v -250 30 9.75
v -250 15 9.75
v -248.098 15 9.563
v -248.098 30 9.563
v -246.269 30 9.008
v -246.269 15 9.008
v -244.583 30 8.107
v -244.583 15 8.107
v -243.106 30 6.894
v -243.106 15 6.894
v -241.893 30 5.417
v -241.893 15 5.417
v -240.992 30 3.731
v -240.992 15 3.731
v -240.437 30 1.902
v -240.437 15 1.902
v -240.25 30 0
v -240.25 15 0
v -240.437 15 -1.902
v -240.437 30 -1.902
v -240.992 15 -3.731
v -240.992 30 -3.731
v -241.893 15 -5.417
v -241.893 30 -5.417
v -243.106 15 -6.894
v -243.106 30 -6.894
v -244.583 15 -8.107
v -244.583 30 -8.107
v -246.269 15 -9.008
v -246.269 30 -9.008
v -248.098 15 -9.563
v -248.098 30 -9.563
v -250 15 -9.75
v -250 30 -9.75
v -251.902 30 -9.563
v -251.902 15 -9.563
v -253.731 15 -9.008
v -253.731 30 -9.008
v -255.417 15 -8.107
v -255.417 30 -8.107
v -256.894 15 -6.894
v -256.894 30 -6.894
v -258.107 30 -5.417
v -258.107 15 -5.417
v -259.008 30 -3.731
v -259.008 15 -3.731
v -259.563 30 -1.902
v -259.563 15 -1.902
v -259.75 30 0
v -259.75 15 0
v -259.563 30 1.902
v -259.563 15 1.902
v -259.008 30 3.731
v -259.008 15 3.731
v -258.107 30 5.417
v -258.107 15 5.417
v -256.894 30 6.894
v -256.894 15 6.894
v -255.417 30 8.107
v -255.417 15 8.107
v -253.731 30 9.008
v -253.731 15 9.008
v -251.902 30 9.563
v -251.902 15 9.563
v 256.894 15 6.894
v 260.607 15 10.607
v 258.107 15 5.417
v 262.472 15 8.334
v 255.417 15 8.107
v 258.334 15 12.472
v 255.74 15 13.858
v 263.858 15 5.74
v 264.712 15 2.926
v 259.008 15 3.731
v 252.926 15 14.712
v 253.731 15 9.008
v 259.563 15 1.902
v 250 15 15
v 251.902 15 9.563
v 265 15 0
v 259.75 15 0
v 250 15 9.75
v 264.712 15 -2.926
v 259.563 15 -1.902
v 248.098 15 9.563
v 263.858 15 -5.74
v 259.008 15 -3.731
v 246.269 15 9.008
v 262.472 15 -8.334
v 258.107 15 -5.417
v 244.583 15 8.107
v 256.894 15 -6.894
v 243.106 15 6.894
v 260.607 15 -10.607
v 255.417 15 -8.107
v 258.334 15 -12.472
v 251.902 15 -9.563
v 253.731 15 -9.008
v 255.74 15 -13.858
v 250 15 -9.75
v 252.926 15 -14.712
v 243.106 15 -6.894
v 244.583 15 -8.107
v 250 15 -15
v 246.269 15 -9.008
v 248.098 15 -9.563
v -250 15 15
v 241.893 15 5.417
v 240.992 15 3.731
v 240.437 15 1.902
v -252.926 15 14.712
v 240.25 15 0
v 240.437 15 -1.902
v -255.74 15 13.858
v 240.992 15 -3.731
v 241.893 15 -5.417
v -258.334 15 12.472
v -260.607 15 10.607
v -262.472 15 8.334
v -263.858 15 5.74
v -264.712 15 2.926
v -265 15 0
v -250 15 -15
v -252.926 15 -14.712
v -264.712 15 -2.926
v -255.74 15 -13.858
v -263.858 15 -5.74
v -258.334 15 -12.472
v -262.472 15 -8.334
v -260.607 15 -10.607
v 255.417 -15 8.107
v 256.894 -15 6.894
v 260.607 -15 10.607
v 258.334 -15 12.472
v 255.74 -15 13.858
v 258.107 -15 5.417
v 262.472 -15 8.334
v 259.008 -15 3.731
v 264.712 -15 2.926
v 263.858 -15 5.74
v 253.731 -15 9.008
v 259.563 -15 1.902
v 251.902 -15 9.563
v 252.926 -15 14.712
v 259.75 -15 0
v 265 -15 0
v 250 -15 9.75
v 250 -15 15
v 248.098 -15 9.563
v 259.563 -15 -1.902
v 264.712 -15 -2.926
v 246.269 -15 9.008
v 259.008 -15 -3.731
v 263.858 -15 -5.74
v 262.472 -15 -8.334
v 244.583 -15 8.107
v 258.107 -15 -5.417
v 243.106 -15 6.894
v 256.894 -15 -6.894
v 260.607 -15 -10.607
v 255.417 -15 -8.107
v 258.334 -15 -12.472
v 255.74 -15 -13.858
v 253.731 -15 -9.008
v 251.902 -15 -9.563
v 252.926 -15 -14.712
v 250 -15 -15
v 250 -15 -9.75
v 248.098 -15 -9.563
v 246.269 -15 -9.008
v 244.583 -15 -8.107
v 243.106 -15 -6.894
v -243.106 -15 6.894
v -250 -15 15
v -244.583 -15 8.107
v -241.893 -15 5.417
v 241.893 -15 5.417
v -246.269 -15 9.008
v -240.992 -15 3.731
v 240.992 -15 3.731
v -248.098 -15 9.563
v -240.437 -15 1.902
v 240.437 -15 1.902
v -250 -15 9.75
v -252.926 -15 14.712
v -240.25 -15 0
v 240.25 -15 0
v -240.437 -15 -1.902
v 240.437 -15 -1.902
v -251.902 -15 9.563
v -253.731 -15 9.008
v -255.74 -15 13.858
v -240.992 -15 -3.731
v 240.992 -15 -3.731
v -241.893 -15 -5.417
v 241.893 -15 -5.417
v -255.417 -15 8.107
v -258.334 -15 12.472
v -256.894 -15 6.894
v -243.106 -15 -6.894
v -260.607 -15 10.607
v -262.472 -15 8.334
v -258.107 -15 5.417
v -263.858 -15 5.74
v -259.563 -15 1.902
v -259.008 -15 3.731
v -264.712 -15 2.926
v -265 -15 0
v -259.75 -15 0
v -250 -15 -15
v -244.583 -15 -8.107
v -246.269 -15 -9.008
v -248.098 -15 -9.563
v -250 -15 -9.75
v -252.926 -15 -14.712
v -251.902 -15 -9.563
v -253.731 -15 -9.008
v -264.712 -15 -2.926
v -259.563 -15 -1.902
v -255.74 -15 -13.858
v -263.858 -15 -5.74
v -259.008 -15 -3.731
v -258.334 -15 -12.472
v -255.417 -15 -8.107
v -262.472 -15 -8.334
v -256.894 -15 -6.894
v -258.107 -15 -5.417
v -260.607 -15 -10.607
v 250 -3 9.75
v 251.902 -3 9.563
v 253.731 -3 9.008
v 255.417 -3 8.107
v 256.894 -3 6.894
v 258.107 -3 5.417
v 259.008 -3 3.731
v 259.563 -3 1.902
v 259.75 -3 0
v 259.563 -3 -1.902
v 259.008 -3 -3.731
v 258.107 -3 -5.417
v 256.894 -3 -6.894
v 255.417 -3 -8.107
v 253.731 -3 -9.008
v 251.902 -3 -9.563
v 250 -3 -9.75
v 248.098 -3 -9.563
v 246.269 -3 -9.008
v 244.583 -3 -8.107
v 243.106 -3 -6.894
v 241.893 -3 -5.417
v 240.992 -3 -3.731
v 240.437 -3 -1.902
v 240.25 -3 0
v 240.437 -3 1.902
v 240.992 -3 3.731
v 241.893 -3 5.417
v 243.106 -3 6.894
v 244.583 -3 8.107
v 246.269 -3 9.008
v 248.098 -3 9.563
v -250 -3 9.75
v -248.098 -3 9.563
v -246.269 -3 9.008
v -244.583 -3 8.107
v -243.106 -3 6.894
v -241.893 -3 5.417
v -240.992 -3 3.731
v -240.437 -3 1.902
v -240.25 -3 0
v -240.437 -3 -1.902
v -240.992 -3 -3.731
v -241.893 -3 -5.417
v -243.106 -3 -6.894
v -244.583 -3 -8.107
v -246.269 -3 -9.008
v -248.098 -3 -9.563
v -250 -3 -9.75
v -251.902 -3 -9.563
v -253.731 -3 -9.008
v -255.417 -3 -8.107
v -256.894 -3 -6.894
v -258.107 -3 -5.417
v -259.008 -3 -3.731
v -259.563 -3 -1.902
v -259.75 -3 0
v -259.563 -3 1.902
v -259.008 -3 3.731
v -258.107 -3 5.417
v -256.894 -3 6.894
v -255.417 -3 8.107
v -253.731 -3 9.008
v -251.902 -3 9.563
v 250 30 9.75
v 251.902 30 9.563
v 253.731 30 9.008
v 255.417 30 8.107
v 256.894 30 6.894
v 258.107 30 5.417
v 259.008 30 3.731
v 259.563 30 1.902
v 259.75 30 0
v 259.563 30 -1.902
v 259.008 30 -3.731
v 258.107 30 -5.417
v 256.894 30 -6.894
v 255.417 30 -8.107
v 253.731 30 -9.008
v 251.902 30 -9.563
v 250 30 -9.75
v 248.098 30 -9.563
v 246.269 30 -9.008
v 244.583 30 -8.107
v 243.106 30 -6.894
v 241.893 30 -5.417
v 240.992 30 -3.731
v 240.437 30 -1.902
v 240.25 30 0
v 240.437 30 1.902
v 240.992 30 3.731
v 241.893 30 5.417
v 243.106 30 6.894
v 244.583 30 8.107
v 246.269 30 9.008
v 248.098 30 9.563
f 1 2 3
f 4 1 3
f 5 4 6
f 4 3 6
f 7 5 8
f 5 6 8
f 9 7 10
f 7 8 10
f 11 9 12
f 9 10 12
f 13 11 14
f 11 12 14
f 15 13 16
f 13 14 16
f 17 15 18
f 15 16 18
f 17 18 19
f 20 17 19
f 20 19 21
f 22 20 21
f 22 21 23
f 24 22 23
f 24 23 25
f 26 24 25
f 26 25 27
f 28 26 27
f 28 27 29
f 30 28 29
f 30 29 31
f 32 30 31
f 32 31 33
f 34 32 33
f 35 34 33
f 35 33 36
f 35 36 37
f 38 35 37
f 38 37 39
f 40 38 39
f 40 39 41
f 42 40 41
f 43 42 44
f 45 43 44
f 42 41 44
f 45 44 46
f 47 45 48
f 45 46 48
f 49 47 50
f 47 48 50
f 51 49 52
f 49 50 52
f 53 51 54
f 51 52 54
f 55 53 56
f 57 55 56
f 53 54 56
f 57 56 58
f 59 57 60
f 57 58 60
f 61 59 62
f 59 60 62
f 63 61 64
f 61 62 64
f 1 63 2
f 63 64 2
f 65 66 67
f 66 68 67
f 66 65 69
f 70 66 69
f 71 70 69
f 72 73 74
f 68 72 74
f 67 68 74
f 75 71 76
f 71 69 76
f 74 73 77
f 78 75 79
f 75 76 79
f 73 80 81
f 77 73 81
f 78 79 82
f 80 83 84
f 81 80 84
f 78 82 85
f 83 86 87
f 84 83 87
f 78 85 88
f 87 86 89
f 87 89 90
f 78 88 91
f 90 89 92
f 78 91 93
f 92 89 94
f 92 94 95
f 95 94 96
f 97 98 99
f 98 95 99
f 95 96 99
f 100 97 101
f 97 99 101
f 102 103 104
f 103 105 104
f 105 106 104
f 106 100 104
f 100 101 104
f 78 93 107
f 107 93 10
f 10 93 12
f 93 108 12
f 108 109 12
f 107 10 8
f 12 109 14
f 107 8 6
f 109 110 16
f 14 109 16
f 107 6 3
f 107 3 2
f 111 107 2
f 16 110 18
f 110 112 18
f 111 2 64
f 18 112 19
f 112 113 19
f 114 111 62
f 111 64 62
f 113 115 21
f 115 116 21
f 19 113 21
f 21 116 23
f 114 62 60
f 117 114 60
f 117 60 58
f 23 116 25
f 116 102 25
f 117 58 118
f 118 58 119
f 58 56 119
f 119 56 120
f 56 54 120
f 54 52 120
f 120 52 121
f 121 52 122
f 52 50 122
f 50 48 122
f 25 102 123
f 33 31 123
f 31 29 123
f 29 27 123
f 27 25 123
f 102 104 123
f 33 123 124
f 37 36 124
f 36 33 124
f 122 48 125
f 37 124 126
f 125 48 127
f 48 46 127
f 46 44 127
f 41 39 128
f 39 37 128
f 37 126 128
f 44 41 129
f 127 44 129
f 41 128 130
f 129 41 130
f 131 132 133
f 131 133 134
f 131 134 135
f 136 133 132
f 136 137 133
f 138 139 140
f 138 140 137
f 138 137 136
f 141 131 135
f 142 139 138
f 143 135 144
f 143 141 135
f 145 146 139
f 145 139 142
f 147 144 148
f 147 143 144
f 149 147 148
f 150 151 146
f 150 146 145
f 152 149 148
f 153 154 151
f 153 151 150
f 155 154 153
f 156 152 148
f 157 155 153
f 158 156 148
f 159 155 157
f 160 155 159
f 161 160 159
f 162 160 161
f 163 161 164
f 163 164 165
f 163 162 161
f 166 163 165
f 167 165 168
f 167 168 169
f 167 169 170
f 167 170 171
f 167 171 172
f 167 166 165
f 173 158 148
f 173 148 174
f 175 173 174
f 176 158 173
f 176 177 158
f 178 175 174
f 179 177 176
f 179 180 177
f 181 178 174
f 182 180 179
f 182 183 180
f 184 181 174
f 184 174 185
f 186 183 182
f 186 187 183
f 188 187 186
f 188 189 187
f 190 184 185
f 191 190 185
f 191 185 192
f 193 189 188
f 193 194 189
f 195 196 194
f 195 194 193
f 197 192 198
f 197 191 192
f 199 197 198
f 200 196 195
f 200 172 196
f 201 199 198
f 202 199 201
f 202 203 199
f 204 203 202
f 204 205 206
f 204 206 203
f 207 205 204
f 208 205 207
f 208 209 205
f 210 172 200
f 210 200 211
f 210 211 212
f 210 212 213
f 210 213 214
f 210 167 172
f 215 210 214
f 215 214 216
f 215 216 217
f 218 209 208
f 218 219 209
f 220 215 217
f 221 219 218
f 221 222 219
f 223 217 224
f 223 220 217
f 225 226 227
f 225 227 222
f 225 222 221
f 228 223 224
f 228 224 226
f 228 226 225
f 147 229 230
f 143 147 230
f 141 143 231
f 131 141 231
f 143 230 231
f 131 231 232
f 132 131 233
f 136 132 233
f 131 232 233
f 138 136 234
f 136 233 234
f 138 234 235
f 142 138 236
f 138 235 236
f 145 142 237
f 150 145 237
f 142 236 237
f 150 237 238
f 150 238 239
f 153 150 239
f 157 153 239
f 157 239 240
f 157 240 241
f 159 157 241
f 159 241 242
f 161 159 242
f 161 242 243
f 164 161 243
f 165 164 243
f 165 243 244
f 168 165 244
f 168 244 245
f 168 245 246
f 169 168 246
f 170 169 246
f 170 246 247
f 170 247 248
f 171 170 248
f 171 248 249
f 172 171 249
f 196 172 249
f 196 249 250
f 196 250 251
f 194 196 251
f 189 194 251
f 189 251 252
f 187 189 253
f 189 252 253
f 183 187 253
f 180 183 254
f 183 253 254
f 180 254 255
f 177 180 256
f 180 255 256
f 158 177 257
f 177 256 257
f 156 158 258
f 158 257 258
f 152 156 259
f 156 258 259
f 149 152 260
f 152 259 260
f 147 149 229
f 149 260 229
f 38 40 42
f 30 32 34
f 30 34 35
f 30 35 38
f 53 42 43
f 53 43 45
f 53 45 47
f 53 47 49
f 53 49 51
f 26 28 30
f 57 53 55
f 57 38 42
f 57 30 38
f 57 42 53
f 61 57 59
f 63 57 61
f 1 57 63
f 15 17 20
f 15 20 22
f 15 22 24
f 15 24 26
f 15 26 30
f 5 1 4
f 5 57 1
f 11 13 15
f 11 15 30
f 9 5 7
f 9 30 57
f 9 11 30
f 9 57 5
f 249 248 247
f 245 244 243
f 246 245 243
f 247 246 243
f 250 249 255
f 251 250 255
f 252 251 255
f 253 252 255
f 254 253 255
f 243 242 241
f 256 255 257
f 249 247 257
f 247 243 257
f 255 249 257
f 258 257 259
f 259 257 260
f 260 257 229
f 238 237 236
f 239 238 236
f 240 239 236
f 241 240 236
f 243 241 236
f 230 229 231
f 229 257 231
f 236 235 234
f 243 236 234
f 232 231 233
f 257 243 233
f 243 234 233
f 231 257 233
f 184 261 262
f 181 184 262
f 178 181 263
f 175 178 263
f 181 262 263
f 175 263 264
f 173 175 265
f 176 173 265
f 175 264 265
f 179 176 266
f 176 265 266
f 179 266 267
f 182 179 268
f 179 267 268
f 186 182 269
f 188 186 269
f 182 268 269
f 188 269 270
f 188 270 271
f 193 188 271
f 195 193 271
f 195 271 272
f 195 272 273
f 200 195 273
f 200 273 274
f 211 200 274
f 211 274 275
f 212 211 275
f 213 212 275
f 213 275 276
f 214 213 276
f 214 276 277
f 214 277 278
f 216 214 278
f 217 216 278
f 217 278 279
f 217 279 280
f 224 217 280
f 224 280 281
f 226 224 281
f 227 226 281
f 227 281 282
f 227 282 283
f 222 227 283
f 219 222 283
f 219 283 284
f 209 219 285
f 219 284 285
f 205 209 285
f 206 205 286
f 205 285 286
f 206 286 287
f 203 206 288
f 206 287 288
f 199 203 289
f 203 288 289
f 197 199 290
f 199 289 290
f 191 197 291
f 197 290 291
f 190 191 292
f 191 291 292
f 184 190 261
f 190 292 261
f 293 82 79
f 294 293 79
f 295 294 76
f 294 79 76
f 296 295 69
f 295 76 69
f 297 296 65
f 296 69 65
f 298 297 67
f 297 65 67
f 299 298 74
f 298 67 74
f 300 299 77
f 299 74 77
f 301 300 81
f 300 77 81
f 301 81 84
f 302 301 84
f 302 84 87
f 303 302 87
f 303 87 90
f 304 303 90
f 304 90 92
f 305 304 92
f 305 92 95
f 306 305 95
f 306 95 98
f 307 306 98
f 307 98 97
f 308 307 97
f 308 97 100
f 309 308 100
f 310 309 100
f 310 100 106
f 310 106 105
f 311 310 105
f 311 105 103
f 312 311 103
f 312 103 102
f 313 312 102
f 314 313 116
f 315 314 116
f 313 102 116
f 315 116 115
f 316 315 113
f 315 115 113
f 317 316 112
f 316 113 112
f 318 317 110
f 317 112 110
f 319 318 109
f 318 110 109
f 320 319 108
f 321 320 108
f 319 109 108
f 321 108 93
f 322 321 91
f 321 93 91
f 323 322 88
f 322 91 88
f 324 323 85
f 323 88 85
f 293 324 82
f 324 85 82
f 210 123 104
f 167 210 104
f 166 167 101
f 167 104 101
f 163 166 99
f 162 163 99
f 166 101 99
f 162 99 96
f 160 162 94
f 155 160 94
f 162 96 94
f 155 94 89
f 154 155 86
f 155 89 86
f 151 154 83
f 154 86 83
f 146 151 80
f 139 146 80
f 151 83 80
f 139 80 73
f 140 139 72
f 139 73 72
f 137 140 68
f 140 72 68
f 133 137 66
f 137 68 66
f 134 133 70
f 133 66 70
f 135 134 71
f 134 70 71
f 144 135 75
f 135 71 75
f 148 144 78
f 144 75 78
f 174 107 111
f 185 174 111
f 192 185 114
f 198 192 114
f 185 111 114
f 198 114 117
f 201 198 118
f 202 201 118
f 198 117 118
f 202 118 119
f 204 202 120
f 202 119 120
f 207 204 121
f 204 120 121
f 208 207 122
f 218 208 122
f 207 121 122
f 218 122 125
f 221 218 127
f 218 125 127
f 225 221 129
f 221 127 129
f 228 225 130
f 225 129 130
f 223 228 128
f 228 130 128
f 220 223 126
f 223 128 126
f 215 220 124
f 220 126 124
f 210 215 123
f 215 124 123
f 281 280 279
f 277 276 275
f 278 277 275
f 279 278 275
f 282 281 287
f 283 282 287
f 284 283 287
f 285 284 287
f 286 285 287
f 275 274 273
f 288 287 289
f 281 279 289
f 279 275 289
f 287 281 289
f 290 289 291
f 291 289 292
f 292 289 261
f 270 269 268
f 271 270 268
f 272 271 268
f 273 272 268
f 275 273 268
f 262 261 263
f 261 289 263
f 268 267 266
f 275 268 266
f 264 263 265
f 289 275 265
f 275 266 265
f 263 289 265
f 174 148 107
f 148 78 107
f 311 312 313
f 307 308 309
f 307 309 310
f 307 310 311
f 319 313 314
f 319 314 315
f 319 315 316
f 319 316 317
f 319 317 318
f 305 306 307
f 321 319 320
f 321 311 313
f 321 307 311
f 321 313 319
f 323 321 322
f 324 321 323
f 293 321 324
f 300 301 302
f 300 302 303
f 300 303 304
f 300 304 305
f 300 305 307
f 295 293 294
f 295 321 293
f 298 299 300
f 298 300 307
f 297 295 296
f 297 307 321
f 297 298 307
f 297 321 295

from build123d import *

# Parameters (mm, degrees)
BOSS_EXTRUDE1_DEPTH = 15
SKETCH2_R           = 9.75
BOSS_EXTRUDE2_DEPTH = 30
SKETCH2_2_R         = 9.75
CUT_EXTRUDE1_DEPTH  = 268.114207784
SKETCH2_3_R         = 9.75
BOSS_EXTRUDE3_DEPTH = 3


with BuildPart() as part:
    # Sketch1 → Boss-Extrude1 (new, symmetric)
    with BuildSketch(Plane(origin=(0, 0, 0), x_dir=(1, 0, 0), z_dir=(0, 1, 0))):
        with BuildLine():
            Line((-250, 15), (250, 15))
            ThreePointArc((250, 15), (265, 0), (250, -15))
            Line((250, -15), (-250, -15))
            ThreePointArc((-250, -15), (-265, 0), (-250, 15))
        make_face()
    extrude(amount=BOSS_EXTRUDE1_DEPTH, both=True)

    # Sketch2 → Boss-Extrude2 (add)
    with BuildSketch(Plane(origin=(0, 0, 0), x_dir=(1, 0, 0), z_dir=(0, 1, 0))):
        with Locations((-250, 0)):
            Circle(SKETCH2_R)
        with Locations((250, 0)):
            Circle(SKETCH2_R)
    extrude(amount=BOSS_EXTRUDE2_DEPTH)

    # Sketch2<2> → Cut-Extrude1 (cut, through all)
    with BuildSketch(Plane(origin=(0, 0, 0), x_dir=(1, 0, 0), z_dir=(0, 1, 0))):
        with Locations((-250, 0)):
            Circle(SKETCH2_2_R)
        with Locations((250, 0)):
            Circle(SKETCH2_2_R)
    extrude(amount=-CUT_EXTRUDE1_DEPTH, mode=Mode.SUBTRACT)

    # Sketch2<3> → Boss-Extrude3 (add)
    with BuildSketch(Plane(origin=(0, 0, 0), x_dir=(1, 0, 0), z_dir=(0, 1, 0))):
        with Locations((-250, 0)):
            Circle(SKETCH2_3_R)
        with Locations((250, 0)):
            Circle(SKETCH2_3_R)
    extrude(amount=-BOSS_EXTRUDE3_DEPTH)


solid = part.part
